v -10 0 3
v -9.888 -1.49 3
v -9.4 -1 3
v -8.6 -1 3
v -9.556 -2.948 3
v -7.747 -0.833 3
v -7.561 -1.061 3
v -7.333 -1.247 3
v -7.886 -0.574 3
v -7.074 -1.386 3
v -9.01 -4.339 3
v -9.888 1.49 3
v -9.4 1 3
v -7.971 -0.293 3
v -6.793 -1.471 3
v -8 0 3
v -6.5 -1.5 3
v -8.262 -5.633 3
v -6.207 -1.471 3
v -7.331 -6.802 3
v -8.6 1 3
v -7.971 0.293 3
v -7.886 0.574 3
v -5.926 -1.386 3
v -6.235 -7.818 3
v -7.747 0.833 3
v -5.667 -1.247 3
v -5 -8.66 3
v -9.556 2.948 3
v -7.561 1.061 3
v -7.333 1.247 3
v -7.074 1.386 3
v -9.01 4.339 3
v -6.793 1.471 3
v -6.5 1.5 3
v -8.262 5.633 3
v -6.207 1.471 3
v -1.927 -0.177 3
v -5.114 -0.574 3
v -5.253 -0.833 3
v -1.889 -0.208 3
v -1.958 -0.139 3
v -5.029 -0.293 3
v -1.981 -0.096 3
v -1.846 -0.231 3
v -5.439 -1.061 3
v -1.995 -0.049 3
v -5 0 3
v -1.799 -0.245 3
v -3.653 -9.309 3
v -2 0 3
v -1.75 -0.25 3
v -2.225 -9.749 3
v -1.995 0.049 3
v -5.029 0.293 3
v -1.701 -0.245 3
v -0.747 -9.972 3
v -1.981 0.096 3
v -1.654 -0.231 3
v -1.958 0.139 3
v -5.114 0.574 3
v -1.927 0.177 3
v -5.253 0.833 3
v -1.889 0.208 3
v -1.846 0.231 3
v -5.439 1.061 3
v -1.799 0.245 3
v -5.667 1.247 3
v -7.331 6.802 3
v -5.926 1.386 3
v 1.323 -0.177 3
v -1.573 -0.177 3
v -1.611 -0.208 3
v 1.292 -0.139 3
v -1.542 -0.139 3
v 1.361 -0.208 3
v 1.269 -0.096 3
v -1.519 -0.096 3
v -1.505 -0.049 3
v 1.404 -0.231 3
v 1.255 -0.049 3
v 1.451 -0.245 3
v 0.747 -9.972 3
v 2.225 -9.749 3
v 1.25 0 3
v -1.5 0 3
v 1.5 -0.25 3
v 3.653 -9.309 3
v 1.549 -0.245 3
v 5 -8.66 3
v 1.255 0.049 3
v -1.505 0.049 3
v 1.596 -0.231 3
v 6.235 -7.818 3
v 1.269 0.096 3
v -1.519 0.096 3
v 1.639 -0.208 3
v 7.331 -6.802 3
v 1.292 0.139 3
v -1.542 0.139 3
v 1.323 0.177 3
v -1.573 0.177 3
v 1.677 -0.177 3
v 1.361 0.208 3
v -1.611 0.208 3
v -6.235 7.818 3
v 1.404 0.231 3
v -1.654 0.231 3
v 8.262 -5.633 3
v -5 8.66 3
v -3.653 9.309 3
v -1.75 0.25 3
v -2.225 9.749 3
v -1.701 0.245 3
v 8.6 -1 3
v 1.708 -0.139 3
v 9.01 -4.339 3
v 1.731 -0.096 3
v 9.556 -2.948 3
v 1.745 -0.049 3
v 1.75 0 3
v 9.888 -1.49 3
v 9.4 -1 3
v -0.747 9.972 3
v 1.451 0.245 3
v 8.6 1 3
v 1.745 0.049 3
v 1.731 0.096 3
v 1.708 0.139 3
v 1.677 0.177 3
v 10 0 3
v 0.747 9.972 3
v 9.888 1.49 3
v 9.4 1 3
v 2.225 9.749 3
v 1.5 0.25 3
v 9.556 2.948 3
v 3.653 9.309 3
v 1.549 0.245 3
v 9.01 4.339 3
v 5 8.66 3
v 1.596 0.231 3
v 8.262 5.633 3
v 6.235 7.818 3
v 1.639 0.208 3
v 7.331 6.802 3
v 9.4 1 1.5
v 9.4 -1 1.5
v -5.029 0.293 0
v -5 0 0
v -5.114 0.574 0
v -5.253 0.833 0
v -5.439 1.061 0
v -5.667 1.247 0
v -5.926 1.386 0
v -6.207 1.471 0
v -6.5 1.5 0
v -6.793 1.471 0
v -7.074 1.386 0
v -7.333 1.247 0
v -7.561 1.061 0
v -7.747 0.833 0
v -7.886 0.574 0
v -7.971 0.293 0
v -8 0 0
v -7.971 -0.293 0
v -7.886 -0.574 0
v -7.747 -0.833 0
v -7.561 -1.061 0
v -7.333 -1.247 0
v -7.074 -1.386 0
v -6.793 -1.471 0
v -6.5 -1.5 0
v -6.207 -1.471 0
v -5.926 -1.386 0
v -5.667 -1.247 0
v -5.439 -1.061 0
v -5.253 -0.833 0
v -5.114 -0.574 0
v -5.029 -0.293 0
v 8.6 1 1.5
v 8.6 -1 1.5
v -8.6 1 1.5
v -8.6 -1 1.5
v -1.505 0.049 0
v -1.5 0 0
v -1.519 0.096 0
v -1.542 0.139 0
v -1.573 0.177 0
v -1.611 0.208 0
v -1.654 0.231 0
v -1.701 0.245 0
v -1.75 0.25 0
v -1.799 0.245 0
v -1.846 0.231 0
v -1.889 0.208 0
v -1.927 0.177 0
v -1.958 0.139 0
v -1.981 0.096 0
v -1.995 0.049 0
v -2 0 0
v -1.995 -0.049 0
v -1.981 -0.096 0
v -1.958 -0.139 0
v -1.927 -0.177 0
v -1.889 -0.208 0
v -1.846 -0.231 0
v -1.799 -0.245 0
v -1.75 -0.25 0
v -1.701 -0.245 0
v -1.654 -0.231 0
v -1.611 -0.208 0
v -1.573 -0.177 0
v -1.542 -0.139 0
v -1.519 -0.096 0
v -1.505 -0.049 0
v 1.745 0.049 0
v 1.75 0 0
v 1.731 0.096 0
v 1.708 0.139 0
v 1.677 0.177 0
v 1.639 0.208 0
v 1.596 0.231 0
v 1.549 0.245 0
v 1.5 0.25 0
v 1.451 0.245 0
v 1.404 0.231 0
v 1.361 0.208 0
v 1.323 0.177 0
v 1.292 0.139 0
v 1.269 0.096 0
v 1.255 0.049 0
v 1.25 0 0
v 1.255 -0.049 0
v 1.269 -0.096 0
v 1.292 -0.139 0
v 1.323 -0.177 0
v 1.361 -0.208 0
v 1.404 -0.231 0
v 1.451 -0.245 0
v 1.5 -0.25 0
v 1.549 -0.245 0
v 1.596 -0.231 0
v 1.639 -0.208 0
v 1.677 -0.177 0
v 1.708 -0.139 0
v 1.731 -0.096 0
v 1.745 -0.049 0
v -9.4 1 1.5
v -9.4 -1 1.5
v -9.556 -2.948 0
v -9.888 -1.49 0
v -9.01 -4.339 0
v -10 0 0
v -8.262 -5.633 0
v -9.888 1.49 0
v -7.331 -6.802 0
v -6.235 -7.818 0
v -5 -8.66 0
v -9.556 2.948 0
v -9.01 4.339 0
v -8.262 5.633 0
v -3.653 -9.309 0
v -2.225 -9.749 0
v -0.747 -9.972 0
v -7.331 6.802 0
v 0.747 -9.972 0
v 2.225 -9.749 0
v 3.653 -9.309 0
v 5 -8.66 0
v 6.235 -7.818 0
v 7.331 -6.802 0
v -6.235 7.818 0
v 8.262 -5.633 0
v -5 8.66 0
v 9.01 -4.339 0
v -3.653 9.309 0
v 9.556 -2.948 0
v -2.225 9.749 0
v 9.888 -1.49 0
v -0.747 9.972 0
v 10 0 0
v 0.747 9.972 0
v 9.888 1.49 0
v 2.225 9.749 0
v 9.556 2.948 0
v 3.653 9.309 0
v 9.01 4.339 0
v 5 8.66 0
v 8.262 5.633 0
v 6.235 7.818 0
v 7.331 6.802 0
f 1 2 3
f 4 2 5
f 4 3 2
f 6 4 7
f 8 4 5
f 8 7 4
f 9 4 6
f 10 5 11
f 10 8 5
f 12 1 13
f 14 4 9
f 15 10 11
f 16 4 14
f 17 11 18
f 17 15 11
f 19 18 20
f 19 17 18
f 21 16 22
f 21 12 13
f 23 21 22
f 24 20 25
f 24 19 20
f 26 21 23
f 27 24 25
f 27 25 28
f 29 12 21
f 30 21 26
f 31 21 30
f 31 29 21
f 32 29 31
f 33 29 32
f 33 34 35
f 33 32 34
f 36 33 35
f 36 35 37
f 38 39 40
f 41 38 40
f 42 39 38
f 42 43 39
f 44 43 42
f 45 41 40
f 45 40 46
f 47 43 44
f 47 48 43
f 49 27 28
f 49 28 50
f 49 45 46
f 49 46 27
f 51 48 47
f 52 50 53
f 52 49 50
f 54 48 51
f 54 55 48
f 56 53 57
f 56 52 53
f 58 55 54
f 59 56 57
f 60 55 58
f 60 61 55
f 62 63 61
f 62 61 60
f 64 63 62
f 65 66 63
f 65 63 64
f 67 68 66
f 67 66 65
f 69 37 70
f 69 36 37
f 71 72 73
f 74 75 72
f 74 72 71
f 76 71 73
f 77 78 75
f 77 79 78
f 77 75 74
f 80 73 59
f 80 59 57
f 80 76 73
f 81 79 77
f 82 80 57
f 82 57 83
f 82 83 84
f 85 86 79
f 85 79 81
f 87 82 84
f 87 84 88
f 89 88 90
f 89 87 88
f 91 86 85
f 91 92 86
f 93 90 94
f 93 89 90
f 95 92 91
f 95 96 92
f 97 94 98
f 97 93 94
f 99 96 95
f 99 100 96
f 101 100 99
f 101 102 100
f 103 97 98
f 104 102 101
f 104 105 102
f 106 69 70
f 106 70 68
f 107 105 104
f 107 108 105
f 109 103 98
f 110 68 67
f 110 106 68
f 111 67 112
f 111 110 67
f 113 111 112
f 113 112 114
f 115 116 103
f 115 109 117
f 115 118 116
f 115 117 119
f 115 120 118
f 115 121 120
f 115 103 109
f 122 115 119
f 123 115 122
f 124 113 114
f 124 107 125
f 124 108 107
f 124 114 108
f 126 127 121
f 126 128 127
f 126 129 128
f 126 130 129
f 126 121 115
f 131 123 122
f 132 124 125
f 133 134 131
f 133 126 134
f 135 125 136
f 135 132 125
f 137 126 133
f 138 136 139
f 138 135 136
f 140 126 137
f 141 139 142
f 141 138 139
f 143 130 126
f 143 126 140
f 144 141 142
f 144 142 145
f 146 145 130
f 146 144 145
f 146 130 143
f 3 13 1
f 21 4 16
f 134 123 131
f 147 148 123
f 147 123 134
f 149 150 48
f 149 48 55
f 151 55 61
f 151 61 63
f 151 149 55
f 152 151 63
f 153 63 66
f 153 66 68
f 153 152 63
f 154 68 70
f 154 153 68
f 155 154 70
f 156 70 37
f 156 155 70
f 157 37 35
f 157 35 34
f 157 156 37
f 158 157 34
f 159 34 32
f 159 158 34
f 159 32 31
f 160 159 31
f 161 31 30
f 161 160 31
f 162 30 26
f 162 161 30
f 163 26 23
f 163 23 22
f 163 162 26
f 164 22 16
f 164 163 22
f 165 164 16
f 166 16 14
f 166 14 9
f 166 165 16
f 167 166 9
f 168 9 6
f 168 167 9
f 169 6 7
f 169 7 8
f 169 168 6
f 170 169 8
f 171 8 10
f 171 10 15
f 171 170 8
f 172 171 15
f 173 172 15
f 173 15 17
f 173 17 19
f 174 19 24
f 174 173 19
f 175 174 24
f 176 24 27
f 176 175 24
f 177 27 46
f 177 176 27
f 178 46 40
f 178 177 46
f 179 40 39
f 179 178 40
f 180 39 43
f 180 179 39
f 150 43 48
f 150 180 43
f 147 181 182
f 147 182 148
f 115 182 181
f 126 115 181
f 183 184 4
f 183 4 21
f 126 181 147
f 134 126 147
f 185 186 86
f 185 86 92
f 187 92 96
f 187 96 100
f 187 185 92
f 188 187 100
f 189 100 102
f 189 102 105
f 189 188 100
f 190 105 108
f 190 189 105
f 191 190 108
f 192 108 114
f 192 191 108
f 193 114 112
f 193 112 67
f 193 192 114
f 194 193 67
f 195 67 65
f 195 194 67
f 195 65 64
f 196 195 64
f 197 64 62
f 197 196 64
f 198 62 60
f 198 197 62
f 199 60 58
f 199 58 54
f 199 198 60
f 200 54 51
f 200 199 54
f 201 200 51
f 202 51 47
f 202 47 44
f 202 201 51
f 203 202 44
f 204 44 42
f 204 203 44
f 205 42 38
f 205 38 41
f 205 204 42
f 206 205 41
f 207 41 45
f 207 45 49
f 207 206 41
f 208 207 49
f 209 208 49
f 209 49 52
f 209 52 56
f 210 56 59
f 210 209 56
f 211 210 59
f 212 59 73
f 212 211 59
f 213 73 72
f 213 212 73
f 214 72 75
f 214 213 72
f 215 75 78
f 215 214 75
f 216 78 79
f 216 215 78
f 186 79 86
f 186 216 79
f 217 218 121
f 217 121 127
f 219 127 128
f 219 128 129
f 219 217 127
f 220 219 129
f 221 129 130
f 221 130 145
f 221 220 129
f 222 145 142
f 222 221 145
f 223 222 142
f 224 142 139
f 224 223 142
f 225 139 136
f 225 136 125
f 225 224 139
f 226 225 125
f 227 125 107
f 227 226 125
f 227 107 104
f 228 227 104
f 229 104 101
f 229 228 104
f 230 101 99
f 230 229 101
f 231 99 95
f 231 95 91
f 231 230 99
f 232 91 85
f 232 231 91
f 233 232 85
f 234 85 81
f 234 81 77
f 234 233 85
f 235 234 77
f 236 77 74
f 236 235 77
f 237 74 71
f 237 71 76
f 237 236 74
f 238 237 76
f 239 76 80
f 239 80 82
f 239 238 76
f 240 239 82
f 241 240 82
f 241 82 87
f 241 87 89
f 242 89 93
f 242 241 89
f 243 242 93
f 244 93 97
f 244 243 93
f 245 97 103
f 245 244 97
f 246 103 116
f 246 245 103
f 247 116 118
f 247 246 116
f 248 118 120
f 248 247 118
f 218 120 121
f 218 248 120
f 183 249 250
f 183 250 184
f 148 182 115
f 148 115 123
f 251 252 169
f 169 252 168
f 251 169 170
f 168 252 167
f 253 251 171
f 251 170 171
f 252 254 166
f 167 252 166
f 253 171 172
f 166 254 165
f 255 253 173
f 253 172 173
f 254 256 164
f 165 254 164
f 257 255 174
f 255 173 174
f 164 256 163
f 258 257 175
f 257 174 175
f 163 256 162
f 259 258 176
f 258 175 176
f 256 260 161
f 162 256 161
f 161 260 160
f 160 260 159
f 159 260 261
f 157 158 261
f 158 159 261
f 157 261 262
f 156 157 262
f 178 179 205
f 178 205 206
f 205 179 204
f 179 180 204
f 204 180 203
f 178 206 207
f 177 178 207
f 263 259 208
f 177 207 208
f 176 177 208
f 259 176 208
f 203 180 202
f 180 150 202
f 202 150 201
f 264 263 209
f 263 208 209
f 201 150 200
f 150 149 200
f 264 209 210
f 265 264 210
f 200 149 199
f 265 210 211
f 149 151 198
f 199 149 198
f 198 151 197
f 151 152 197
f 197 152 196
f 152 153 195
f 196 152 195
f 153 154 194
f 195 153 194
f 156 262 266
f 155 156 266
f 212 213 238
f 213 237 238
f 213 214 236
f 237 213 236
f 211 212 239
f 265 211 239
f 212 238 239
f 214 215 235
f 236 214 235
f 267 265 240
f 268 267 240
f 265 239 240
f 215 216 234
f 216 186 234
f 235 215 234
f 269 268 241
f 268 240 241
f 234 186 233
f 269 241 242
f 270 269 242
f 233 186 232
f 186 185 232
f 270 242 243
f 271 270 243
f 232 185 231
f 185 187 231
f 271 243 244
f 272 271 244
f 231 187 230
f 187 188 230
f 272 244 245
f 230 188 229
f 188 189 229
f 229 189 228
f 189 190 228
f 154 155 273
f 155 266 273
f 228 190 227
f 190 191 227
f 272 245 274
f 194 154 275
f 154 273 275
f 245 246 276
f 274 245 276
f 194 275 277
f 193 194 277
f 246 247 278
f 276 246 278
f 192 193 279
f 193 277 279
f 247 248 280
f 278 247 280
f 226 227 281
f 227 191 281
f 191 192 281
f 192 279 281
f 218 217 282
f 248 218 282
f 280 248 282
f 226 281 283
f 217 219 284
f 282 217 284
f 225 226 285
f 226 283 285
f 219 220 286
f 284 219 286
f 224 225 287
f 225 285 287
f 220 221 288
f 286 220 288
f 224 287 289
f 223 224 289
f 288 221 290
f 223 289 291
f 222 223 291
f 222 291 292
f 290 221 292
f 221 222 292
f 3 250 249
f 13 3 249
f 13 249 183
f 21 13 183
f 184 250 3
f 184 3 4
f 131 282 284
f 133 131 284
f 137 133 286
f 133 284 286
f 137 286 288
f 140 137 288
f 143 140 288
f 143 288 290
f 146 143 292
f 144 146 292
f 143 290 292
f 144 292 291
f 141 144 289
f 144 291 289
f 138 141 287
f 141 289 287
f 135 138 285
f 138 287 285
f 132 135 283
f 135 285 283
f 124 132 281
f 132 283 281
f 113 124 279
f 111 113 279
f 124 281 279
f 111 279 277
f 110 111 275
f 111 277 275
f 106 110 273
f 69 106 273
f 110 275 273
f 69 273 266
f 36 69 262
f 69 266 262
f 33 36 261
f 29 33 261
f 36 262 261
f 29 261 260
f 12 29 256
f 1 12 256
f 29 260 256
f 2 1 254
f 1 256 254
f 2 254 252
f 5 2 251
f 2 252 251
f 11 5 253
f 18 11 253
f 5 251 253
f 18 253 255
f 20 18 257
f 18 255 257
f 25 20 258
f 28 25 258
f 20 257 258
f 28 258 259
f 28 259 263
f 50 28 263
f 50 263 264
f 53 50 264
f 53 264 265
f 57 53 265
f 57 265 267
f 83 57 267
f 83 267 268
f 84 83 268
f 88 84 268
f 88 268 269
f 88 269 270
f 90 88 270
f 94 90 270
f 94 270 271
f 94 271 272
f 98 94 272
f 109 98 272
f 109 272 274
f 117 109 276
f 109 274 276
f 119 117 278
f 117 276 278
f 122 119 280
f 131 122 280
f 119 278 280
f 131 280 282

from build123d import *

# Parameters (mm, degrees)
F0_R     = 10
F0_W     = 0.8
F0_H     = 2
F0_R_2   = 1.5
F0_R_3   = 0.25
F1_DEPTH = 3
F2_DEPTH = 1.5


with BuildPart() as f1:
    # F0 (on Top) → F1 (new body)
    with BuildSketch(Plane.XY):
        Circle(F0_R)
        with Locations((-9, 0)):
            Rectangle(F0_W, F0_H, mode=Mode.SUBTRACT)
        with Locations((-6.5, 0)):
            Circle(F0_R_2, mode=Mode.SUBTRACT)
        with Locations((-1.75, 0)):
            Circle(F0_R_3, mode=Mode.SUBTRACT)
        with Locations((1.5, 0)):
            Circle(F0_R_3, mode=Mode.SUBTRACT)
        with Locations((9, 0)):
            Rectangle(F0_W, F0_H, mode=Mode.SUBTRACT)
    extrude(amount=F1_DEPTH)

    # F0 (on Top) → F2 (join)
    with BuildSketch(Plane.XY):
        with Locations((-9, 0)):
            Rectangle(F0_W, F0_H)
        with Locations((9, 0)):
            Rectangle(F0_W, F0_H)
    extrude(amount=F2_DEPTH)


solid = f1.part
